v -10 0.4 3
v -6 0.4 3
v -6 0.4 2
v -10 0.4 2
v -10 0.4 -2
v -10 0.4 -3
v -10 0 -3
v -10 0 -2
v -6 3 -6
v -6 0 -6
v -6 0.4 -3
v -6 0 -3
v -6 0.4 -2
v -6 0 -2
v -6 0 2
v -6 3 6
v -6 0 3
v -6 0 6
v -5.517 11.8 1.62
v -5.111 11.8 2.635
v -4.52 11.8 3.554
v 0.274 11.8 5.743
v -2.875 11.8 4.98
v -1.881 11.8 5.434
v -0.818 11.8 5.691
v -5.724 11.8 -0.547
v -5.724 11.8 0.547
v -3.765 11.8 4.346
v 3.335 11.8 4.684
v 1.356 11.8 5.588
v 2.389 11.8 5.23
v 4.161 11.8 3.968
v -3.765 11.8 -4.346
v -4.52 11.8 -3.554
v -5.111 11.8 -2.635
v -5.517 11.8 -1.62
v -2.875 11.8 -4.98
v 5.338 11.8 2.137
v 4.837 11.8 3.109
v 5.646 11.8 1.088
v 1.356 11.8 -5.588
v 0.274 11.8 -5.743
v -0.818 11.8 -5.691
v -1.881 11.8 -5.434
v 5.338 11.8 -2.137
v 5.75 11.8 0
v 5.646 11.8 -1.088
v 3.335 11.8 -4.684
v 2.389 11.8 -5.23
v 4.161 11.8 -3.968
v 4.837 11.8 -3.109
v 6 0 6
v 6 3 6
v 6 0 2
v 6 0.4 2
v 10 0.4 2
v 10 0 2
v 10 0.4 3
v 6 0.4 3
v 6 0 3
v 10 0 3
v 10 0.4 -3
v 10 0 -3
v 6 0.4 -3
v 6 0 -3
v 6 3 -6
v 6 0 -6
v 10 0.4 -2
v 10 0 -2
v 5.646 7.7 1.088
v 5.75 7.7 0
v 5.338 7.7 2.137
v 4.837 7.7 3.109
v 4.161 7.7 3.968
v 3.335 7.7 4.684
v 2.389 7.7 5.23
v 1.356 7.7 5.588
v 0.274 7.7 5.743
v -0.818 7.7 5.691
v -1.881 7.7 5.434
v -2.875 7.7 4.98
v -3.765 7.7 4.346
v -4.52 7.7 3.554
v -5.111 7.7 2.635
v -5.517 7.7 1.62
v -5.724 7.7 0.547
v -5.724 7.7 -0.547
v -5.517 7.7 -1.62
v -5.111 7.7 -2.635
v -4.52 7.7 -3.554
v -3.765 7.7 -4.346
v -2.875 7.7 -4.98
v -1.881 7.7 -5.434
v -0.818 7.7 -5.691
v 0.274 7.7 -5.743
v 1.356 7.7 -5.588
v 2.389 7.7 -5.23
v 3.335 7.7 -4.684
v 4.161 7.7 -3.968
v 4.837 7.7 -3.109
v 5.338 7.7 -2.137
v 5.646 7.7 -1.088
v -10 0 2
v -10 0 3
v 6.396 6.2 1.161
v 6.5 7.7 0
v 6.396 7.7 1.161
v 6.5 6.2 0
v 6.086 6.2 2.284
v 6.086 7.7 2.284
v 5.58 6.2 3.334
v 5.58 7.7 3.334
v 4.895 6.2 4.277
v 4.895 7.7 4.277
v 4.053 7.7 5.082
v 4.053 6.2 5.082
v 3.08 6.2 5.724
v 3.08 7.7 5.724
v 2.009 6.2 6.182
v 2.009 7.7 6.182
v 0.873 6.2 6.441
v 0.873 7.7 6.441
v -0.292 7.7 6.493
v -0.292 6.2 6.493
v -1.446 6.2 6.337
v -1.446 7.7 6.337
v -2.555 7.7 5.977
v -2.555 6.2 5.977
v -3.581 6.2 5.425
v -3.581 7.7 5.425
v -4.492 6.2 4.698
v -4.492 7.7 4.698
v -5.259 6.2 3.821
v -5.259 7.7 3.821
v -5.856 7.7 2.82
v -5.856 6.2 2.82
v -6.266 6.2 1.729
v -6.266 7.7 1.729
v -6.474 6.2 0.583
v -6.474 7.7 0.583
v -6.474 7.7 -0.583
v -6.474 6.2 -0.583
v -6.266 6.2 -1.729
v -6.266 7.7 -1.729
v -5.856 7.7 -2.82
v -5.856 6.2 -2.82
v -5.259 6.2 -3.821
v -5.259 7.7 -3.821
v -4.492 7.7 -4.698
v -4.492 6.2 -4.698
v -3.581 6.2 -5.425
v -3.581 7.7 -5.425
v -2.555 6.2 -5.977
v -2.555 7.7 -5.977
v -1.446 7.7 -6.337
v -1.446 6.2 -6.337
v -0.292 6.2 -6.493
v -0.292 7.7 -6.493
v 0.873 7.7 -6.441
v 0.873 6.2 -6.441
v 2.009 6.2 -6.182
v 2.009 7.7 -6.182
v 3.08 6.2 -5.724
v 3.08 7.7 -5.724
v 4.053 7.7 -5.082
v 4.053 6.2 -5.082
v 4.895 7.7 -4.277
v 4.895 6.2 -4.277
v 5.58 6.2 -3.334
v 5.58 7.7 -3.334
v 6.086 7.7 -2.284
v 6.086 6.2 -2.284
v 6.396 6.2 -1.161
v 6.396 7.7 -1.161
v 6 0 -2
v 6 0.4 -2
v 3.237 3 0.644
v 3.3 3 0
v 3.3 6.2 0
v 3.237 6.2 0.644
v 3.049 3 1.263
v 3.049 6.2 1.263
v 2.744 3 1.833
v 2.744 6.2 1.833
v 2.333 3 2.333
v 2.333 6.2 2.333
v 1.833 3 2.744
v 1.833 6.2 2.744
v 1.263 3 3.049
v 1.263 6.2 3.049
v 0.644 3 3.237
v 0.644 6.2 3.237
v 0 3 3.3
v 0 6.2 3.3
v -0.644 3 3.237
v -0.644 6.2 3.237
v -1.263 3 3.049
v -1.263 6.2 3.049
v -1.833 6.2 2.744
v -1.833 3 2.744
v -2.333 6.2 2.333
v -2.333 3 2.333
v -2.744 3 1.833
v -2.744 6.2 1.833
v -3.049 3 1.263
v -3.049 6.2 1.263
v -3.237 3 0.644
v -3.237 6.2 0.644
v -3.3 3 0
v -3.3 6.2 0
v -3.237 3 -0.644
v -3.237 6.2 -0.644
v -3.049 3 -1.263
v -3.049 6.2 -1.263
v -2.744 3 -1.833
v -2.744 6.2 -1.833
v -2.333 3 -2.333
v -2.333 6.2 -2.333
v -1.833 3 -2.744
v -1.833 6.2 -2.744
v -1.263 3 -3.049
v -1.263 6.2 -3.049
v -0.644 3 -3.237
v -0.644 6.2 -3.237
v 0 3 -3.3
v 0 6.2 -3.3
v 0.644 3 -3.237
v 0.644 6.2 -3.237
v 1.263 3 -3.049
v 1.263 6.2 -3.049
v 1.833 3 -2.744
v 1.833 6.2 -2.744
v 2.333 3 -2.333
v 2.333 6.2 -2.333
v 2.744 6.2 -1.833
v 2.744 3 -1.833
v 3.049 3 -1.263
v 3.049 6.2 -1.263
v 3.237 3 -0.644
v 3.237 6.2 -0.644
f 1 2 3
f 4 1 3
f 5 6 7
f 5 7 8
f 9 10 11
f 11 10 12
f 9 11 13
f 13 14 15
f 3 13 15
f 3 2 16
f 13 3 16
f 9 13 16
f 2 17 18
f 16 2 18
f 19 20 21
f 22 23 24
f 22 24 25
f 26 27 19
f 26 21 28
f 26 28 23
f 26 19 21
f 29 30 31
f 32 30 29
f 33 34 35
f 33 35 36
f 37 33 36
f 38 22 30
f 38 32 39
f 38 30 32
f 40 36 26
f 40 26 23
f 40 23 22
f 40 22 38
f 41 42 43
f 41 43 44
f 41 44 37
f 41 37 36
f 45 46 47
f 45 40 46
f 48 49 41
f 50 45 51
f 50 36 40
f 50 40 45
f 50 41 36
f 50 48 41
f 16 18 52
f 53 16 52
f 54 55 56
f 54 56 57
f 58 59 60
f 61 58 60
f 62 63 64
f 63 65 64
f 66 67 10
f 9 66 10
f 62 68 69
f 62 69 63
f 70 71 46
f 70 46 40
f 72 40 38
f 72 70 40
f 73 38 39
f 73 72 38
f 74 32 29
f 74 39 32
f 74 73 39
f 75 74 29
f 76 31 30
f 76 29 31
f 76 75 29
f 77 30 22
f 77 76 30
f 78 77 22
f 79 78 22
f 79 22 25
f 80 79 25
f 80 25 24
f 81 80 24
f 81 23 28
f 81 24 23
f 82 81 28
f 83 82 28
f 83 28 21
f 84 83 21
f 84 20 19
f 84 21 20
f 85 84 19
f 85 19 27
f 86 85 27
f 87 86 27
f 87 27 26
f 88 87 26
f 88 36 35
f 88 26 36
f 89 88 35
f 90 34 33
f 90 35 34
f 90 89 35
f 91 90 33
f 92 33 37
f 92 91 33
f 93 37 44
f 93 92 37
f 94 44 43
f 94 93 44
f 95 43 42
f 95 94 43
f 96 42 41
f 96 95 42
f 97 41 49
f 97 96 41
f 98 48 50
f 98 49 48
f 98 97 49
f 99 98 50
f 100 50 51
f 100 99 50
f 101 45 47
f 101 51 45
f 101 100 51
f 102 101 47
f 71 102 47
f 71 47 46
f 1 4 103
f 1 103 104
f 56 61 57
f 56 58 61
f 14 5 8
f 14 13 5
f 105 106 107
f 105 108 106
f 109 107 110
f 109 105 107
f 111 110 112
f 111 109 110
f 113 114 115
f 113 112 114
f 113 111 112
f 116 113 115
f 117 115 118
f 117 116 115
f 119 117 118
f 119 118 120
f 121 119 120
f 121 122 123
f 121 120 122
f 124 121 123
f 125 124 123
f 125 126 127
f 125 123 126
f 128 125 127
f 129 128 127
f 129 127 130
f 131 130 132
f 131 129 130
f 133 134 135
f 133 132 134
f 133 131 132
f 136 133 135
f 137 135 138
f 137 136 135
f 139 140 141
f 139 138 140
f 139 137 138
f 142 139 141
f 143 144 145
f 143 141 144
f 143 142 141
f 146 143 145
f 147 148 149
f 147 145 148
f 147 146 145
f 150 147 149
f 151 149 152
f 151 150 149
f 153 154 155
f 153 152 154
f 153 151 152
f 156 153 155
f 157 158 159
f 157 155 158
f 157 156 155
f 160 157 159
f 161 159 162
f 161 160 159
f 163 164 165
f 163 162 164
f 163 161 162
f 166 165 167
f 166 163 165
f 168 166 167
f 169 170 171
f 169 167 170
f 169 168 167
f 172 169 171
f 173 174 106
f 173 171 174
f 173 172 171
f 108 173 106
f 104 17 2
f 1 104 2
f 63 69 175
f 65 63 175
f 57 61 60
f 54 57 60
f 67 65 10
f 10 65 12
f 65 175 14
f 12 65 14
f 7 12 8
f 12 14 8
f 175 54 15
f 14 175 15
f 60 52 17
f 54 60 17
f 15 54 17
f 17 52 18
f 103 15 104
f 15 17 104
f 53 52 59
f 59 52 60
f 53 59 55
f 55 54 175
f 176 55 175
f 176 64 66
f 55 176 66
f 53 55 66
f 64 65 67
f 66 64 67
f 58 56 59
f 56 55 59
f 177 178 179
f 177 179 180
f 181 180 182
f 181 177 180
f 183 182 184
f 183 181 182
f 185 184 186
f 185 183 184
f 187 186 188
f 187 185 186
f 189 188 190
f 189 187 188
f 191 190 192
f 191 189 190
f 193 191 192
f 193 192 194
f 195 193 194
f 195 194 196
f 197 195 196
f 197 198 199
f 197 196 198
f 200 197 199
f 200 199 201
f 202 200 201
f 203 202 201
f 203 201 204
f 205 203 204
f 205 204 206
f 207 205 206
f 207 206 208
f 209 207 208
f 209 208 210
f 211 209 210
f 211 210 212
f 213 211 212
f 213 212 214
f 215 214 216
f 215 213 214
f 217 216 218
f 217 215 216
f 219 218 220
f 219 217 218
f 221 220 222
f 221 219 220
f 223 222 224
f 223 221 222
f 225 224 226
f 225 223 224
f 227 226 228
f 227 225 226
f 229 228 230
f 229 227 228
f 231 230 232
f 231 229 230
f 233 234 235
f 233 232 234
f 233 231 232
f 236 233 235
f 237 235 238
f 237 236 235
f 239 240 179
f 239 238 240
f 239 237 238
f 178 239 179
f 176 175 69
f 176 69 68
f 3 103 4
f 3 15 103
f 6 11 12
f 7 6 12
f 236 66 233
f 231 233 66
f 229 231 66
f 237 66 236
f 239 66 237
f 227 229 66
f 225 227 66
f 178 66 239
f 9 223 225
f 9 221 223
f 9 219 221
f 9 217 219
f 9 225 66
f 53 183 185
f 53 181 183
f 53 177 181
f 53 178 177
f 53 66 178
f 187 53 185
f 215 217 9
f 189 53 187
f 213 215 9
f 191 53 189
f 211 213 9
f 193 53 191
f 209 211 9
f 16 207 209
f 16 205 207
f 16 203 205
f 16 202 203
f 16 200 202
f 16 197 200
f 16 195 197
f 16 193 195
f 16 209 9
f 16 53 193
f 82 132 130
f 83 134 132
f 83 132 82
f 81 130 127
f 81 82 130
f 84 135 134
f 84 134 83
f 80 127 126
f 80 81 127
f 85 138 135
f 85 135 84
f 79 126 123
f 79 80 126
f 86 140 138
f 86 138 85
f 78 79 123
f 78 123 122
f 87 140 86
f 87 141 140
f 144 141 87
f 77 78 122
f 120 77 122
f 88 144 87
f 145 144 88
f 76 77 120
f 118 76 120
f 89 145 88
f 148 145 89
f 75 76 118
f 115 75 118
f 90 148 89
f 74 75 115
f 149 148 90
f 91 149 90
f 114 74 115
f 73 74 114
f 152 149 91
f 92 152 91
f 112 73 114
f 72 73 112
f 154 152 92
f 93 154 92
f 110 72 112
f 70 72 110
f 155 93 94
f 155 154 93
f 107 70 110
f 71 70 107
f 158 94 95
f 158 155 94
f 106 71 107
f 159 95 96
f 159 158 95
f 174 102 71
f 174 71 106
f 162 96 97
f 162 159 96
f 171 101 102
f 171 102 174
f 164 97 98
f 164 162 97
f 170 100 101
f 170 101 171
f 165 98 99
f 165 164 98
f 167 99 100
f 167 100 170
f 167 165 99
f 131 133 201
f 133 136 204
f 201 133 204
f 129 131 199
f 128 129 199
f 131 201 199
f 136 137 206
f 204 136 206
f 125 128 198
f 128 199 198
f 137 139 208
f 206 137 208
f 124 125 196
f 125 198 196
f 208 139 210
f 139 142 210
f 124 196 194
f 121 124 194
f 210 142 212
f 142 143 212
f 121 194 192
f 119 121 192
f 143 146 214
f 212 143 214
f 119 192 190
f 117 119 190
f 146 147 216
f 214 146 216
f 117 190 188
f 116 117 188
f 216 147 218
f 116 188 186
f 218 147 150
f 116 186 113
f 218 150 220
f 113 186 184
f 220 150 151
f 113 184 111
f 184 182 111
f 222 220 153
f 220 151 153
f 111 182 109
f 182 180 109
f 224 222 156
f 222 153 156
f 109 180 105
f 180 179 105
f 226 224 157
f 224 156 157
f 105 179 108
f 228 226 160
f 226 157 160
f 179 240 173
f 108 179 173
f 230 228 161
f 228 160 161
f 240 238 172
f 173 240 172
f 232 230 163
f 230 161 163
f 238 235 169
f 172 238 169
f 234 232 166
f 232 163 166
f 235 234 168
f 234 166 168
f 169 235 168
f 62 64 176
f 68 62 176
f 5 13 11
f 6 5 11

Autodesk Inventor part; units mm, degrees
ref_plane "YZ Plane" through (0, 0, 0) normal (1, 0, 0) x (0, 1, 0)
ref_plane "XZ Plane" through (0, 0, 0) normal (0, 1, 0) x (-1, 0, 0)
ref_plane "XY Plane" through (0, 0, 0) normal (0, 0, 1) x (1, 0, 0)
sketch "Sketch3" plane through (0, 0, 0) normal (0, 1, 0) x (-1, 0, 0)
  line L0 (6, 6) -> (-6, 6)
  line L1 (-6, 6) -> (-6, -6)
  line L2 (-6, -6) -> (6, -6)
  line L3 (6, -6) -> (6, 6)
  line L4 (6, 6) -> (-6, -6) construction
  line L5 (-6, 6) -> (6, -6) construction
  point P0 (0, 0)
  dimension "d7" = 12
  dimension "d8" = 12
extrude "Extrusion3" add sketch "Sketch3" along normal blind 3
sketch "Sketch4" plane through (0, 3, 0) normal (0, 1, 0) x (1, 0, 0)
  circle A0 centre (0, 0) radius 3.3
  dimension "d11" = 6.6
extrude "Extrusion4" add sketch "Sketch4" along normal blind 3.2
sketch "Sketch5" plane through (0, 6.2, 0) normal (0, 1, 0) x (1, 0, 0)
  circle A0 centre (0, 0) radius 6.5
  dimension "d14" = 13
extrude "Extrusion5" add sketch "Sketch5" along normal blind 1.5
sketch "Sketch6" plane through (0, 7.7, 0) normal (0, 1, 0) x (1, 0, 0)
  circle A0 centre (0, 0) radius 5.75
  dimension "d17" = 11.5
extrude "Extrusion6" add sketch "Sketch6" along normal blind 4.1
sketch "Sketch7" plane through (-6, 0, -6) normal (-1, 0, 0) x (0, 0, 1)
  line L0 (3, -0.4) -> (9, -0.4)
  line L1 (9, -0.4) -> (9, 0.4)
  line L2 (9, 0.4) -> (3, 0.4)
  line L3 (3, 0.4) -> (3, -0.4)
  line L4 (3, -0.4) -> (9, 0.4) construction
  line L5 (9, -0.4) -> (3, 0.4) construction
  line L6 (4, -0.4) -> (8, -0.4)
  line L7 (8, -0.4) -> (8, 0.4)
  line L8 (8, 0.4) -> (4, 0.4)
  line L9 (4, 0.4) -> (4, -0.4)
  line L10 (4, -0.4) -> (8, 0.4) construction
  line L11 (8, -0.4) -> (4, 0.4) construction
  line L12 (0, 0) -> (12, 0) projected
  point P0 (6, 0)
  point P1 (8, 0)
  point P2 (9, 0)
  point P3 (3, 0)
  point P4 (4, 0)
  dimension "d20" = 6
  dimension "d21" = 0.8
  dimension "d22" = 4
extrude "Extrusion7" add sketch "Sketch7" along normal blind 4 contours L3 L2 L9 L12 | L7 L2 L1 L12
mirror "Mirror1" about plane through (0, 0, 0) normal (1, 0, 0) of "Extrusion7"
properties part number "Button"
